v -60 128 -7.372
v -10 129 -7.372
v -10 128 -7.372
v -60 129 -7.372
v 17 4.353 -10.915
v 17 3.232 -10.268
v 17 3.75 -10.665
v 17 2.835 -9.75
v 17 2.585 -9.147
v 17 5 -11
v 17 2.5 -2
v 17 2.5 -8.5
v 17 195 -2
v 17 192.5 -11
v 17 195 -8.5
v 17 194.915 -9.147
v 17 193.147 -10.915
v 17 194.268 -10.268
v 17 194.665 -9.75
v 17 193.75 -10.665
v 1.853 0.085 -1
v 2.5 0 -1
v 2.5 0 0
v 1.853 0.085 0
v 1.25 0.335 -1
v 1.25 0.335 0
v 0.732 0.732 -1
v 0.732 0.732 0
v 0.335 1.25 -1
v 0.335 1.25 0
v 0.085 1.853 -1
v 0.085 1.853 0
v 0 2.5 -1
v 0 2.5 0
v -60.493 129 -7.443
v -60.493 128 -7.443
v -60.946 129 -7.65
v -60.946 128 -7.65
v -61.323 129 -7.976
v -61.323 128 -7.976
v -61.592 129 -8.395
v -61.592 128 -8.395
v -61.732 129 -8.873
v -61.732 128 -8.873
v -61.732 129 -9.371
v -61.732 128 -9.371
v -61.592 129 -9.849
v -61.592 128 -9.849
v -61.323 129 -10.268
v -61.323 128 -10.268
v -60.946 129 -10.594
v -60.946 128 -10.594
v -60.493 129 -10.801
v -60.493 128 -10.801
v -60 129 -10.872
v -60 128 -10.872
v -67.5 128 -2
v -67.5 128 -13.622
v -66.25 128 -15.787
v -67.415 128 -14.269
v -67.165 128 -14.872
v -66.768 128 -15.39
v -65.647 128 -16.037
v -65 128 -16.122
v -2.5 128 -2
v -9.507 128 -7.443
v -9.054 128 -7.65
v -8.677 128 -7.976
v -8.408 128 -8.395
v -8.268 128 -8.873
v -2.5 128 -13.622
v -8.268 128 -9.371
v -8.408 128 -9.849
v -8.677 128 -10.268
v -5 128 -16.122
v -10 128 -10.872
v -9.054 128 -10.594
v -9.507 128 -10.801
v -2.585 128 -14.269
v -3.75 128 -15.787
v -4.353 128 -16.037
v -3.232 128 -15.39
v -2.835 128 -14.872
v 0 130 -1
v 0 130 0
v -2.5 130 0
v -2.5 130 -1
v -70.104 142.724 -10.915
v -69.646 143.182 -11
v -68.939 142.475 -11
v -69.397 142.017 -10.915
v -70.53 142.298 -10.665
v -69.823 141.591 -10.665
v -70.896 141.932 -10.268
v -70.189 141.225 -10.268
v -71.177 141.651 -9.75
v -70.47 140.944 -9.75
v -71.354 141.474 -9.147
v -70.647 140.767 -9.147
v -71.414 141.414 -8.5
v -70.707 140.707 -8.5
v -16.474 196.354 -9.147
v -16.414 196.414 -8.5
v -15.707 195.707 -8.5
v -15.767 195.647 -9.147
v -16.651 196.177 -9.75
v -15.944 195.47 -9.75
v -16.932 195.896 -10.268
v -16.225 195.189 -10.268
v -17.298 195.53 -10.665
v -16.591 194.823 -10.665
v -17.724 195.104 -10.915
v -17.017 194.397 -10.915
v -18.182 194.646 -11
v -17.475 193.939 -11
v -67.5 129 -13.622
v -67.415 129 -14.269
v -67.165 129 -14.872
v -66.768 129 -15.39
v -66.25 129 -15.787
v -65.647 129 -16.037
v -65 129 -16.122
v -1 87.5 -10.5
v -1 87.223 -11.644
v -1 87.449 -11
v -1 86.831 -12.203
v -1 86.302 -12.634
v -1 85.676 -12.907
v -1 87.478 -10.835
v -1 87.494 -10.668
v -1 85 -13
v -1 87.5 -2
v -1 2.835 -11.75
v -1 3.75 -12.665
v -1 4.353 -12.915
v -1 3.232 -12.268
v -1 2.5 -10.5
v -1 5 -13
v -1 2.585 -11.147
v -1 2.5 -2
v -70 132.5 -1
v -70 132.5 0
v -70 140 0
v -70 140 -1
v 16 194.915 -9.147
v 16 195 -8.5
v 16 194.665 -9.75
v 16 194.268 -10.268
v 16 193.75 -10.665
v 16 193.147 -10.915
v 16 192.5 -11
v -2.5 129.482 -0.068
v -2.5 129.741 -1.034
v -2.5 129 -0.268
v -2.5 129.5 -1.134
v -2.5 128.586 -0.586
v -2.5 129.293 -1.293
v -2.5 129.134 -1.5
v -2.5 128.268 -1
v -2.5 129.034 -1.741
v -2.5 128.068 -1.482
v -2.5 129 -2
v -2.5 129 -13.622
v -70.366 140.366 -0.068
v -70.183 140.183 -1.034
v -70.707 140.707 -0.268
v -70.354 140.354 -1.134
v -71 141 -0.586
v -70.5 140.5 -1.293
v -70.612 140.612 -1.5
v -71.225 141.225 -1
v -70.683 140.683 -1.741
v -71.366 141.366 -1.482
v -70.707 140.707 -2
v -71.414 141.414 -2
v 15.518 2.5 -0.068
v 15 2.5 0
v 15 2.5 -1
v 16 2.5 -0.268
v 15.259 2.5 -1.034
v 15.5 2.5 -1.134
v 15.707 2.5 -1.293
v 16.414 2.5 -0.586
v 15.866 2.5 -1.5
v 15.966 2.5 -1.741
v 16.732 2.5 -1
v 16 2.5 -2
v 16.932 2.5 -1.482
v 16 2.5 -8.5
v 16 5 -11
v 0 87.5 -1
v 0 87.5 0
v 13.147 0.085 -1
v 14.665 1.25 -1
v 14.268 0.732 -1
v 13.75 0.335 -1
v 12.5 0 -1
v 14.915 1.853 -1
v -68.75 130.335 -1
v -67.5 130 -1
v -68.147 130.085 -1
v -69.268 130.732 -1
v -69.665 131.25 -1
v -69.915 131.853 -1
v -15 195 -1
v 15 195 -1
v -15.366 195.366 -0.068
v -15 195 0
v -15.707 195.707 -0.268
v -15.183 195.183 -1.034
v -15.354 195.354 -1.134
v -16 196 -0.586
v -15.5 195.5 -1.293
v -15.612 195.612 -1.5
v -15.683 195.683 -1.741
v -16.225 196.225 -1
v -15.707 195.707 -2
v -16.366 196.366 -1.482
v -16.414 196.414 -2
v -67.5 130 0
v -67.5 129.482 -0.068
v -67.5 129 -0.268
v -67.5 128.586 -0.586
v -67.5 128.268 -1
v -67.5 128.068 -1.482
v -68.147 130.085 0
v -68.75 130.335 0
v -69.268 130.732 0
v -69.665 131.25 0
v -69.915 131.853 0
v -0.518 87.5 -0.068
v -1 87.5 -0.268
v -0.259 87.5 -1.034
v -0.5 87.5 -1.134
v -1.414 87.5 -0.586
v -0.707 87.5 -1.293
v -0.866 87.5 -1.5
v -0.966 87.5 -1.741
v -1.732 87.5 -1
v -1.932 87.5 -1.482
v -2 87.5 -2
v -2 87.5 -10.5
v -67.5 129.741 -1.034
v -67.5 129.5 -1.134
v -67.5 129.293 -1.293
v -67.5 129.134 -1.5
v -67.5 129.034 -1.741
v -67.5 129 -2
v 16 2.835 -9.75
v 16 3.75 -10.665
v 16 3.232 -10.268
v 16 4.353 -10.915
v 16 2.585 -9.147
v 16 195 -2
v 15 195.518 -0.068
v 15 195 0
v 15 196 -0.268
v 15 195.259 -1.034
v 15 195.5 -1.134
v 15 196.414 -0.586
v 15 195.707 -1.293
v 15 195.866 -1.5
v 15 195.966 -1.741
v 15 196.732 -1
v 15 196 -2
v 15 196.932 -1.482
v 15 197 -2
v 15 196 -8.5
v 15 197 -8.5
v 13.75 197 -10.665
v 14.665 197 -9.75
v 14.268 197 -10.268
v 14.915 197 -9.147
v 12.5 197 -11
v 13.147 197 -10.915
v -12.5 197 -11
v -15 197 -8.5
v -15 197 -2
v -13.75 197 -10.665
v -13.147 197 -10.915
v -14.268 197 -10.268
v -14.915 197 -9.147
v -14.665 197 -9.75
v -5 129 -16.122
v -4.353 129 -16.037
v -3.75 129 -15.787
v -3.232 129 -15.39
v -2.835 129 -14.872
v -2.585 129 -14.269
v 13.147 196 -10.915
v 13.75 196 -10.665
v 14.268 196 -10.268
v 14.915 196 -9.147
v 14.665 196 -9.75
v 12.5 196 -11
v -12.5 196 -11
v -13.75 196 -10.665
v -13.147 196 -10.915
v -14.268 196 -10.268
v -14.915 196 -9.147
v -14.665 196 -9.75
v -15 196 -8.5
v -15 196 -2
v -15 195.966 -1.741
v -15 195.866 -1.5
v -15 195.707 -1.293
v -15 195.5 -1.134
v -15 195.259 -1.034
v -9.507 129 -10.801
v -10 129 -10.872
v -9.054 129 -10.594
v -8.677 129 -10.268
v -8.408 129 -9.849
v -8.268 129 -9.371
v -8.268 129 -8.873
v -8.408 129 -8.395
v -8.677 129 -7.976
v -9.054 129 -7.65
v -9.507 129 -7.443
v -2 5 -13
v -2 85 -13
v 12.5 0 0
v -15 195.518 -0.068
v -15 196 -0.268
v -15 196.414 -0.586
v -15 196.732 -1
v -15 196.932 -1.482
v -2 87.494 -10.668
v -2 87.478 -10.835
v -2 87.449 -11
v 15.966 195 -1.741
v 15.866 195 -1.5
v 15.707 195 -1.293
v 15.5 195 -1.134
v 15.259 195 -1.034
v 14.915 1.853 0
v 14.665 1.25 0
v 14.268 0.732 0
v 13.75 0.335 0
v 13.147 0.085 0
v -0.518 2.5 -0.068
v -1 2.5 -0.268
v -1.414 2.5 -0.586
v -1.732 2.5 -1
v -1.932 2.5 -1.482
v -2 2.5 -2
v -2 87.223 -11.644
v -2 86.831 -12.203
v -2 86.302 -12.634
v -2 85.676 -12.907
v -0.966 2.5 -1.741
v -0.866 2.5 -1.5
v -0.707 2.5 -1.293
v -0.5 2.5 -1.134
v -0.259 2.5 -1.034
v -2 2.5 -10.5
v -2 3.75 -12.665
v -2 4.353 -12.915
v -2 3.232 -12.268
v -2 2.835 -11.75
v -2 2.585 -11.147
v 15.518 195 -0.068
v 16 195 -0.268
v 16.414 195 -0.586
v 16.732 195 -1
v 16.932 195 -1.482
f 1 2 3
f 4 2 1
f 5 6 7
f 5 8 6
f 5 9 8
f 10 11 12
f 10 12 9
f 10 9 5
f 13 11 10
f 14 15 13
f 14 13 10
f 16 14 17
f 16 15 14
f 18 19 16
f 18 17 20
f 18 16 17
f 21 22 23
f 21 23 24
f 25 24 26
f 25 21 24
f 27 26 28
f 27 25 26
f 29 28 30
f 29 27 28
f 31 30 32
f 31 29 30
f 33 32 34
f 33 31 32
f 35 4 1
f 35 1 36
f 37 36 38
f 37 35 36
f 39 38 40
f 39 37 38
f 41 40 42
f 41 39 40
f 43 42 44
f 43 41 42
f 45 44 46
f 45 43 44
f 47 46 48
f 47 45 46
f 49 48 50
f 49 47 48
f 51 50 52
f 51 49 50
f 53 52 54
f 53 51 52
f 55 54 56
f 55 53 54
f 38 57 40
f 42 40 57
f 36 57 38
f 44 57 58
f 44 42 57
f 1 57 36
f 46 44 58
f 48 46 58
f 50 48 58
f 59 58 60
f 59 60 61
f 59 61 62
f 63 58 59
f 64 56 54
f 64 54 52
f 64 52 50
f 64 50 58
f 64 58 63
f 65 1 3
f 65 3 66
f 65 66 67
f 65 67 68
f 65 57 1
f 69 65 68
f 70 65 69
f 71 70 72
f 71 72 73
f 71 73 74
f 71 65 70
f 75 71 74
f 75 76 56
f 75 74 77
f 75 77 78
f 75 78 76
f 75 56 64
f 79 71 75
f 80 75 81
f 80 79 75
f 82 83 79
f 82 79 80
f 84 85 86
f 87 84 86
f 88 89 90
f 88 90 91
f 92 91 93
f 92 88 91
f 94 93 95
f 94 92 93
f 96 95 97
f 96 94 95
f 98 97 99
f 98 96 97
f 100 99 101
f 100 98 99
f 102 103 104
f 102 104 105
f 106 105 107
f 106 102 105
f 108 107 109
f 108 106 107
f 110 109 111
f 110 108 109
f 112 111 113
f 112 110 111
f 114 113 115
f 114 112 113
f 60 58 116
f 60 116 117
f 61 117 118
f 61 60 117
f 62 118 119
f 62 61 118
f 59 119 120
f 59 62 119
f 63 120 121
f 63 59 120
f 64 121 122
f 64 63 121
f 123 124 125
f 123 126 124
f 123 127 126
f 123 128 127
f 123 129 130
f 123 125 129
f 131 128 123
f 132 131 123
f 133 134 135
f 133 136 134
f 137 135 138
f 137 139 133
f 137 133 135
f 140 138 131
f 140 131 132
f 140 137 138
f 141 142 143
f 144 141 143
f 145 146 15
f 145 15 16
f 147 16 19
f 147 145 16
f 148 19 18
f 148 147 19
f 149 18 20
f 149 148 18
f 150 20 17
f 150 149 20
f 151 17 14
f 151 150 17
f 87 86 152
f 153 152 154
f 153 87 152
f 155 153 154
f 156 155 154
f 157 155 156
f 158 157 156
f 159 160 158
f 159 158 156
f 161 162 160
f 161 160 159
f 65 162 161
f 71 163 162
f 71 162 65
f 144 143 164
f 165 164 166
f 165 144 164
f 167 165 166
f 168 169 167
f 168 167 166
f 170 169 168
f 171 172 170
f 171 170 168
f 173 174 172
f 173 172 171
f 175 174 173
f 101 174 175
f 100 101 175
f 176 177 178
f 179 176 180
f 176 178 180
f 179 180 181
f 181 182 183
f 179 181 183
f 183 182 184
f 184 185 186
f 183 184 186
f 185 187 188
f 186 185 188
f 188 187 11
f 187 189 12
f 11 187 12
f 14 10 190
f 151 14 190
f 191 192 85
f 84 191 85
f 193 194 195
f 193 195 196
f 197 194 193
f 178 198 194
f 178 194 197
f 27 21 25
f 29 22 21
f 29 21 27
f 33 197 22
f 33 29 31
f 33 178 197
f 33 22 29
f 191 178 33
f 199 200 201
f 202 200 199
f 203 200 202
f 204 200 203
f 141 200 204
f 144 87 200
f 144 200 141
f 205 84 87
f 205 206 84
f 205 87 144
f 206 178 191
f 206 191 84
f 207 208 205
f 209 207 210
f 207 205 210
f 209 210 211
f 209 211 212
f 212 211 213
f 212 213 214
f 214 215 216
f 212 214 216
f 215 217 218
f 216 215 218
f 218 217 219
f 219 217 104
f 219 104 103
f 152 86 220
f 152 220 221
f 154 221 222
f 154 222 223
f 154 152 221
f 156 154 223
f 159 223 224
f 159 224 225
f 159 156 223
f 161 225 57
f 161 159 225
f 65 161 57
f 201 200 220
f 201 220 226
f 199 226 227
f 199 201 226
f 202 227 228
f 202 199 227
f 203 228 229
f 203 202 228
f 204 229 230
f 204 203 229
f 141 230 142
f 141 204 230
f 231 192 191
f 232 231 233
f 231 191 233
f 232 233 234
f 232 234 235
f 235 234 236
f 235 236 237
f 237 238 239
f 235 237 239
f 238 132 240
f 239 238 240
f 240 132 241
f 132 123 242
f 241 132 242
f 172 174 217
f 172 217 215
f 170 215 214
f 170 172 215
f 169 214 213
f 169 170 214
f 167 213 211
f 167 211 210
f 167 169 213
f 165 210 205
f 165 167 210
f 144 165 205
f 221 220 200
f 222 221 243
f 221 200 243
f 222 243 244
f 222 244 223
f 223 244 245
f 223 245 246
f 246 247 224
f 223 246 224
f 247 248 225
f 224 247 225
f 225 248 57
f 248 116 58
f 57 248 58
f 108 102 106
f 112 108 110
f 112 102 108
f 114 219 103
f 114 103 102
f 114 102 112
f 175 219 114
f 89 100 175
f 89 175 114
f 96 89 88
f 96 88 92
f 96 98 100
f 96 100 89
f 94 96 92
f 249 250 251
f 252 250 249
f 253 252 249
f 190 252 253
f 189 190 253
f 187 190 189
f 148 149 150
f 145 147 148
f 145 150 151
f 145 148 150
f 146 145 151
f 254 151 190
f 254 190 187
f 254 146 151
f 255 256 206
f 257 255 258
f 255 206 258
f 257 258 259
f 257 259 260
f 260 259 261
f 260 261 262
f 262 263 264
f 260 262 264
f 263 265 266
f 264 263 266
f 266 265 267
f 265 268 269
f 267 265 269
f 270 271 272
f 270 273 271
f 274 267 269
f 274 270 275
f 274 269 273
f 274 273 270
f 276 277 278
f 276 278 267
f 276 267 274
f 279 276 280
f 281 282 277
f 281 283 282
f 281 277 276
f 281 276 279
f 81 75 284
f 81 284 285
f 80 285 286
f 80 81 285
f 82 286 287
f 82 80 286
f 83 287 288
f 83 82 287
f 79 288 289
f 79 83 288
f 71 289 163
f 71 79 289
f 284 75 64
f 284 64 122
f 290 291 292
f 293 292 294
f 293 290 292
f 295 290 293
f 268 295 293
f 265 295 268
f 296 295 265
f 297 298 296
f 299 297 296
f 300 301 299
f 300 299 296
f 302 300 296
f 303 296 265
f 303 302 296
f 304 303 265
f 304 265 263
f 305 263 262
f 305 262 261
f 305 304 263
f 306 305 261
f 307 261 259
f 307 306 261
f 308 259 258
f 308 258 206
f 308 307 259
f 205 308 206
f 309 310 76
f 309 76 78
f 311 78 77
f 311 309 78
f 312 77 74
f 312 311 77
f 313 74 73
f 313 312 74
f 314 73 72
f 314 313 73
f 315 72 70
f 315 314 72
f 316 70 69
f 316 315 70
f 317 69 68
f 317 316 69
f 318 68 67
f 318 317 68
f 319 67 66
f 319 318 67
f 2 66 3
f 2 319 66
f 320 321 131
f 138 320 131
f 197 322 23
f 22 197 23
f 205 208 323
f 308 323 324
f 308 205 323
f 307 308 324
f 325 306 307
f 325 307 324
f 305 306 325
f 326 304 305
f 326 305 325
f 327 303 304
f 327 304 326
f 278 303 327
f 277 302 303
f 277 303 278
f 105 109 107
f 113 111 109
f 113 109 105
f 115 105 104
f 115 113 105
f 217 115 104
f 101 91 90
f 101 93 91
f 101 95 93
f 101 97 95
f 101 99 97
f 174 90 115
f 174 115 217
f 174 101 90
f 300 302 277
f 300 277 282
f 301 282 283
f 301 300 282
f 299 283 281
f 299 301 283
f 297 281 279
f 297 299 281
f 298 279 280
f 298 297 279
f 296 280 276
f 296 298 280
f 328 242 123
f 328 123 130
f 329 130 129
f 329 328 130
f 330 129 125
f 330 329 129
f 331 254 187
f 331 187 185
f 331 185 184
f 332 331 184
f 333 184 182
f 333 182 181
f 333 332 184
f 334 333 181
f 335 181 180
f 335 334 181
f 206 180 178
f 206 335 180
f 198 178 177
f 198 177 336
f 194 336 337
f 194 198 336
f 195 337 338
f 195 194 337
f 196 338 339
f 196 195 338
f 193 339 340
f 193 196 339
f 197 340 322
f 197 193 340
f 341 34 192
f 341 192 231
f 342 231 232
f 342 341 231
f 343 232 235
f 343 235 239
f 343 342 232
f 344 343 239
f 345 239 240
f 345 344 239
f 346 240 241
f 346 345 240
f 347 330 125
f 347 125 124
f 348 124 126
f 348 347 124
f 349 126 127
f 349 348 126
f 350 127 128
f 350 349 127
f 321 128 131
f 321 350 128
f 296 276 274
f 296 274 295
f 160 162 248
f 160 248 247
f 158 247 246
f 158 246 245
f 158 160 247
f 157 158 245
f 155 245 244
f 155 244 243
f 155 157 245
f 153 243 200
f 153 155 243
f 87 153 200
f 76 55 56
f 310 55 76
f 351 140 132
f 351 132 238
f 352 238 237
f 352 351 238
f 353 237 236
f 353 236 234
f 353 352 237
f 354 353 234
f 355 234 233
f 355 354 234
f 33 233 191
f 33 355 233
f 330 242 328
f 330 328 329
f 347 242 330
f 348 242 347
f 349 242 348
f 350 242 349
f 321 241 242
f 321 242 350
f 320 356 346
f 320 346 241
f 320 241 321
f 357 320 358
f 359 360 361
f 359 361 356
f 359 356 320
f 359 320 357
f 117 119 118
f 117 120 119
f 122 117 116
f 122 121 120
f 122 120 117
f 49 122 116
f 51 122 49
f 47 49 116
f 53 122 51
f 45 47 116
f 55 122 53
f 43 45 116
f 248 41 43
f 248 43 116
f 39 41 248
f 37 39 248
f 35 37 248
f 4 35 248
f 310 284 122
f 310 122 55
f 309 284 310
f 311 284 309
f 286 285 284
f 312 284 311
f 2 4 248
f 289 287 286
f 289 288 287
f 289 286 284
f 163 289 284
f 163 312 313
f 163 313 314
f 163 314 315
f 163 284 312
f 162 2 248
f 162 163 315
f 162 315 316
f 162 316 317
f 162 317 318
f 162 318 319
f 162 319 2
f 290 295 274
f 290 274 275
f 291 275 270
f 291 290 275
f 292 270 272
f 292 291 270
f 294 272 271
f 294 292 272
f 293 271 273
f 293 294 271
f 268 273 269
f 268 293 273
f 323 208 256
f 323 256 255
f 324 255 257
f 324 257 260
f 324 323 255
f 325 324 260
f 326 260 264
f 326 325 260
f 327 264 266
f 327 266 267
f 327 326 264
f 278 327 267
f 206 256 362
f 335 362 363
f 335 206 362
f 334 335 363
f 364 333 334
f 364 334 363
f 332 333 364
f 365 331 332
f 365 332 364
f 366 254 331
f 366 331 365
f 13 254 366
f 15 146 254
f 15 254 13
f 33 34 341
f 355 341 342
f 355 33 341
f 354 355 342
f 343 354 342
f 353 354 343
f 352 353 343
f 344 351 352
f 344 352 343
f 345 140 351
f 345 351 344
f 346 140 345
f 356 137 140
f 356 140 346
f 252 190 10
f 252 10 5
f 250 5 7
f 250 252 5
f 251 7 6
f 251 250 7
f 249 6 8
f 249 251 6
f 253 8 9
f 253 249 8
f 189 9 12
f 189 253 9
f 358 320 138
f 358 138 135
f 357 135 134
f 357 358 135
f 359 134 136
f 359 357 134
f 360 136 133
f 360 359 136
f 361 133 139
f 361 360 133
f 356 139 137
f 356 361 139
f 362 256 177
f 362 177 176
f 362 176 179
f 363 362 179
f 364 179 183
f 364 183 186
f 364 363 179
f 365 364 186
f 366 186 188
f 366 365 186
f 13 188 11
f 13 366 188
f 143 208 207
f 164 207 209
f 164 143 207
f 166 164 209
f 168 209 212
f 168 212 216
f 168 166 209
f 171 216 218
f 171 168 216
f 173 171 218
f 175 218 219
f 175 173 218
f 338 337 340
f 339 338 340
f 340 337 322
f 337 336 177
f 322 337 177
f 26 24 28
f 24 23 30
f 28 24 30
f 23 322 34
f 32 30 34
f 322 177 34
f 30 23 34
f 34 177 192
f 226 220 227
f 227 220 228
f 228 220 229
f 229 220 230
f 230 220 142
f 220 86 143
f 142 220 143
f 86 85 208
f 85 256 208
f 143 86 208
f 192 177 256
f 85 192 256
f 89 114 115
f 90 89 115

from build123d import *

# Parameters (mm, degrees)
BASE_FLANGE1_DEPTH    = 1
EDGE_FLANGE2_DEPTH    = 85
EDGE_FLANGE3_DEPTH    = 192.5
EDGE_FLANGE1_DEPTH    = 65
EDGE_FLANGE4_DEPTH    = 77.781745931
EDGE_FLANGE5_DEPTH    = 30
BREAK_CORNER1_START   = 128
BREAK_CORNER1_DEPTH   = 69
BREAK_CORNER1_START_2 = 196
BREAK_CORNER1_2_DEPTH = 1
BREAK_CORNER1_START_3 = -150.492424049
BREAK_CORNER1_3_DEPTH = 1
BREAK_CORNER1_START_4 = -2
BREAK_CORNER1_4_DEPTH = 19
BREAK_CORNER1_START_5 = 16
BREAK_CORNER1_5_DEPTH = 1
BREAK_CORNER1_6_DEPTH = 1
BREAK_CORNER1_START_6 = -1
BREAK_CORNER1_7_DEPTH = 1
CUT_EXTRUDE1_REACH    = 150.327


# Read off the part's stored shape, not the designer's step: Break-Corner1
# Sheet-metal steps are written as plain solids
with BuildPart() as part:
    # Sketch1 → Base-Flange1 (new body)
    with BuildSketch(Plane.XY):
        Polygon((0, 130), (-70, 130), (-70, 140), (-15, 195), (15, 195), (15, 130), (15, 0), (0, 0), align=None)
    extrude(amount=-BASE_FLANGE1_DEPTH)

    # Edge-Flange2 section (across the edge) → Edge-Flange2 (add)
    with BuildSketch(Plane(origin=(-1, 2.5, -1), x_dir=(1, 0, 0), z_dir=(0, 1, 0))):
        with BuildLine():
            Line((-1, 1), (-1, 12))
            Line((-1, 12), (0, 12))
            Line((0, 12), (0, 1))
            ThreePointArc((0, 1), (0.292893219, 0.292893219), (1, 0))
            Line((1, 0), (1, -1))
            ThreePointArc((1, -1), (-0.414213562, -0.414213562), (-1, 1))
        make_face()
    extrude(amount=EDGE_FLANGE2_DEPTH)

    # Edge-Flange3 section (across the edge) → Edge-Flange3 (add)
    with BuildSketch(Plane(origin=(16, 195, -1), x_dir=(-1, 0, 0), z_dir=(0, -1, 0))):
        with BuildLine():
            Line((-1, 1), (-1, 10))
            Line((-1, 10), (0, 10))
            Line((0, 10), (0, 1))
            ThreePointArc((0, 1), (0.292893219, 0.292893219), (1, 0))
            Line((1, 0), (1, -1))
            ThreePointArc((1, -1), (-0.414213562, -0.414213562), (-1, 1))
        make_face()
    extrude(amount=EDGE_FLANGE3_DEPTH)

    # Edge-Flange1 section (across the edge) → Edge-Flange1 (add)
    with BuildSketch(Plane(origin=(-2.5, 129, -1), x_dir=(0, 1, 0), z_dir=(-1, 0, 0))):
        with BuildLine():
            Line((-1, 1), (-1, 15.122069622))
            Line((-1, 15.122069622), (0, 15.122069622))
            Line((0, 15.122069622), (0, 1))
            ThreePointArc((0, 1), (0.292893219, 0.292893219), (1, 0))
            Line((1, 0), (1, -1))
            ThreePointArc((1, -1), (-0.414213562, -0.414213562), (-1, 1))
        make_face()
    extrude(amount=EDGE_FLANGE1_DEPTH)

    # Edge-Flange4 section (across the edge) → Edge-Flange4 (add)
    with BuildSketch(Plane(origin=(-70.707106781, 140.707106781, -1), x_dir=(0.7071067811865439, -0.7071067811865512, -3.4914813388431337e-15), z_dir=(0.7071067811865512, 0.7071067811865439, 0))):
        with BuildLine():
            Line((-1, 1), (-1, 10))
            Line((-1, 10), (0, 10))
            Line((0, 10), (0, 1))
            ThreePointArc((0, 1), (0.292893219, 0.292893219), (1, 0))
            Line((1, 0), (1, -1))
            ThreePointArc((1, -1), (-0.414213562, -0.414213562), (-1, 1))
        make_face()
    extrude(amount=EDGE_FLANGE4_DEPTH)

    # Edge-Flange5 section (across the edge) → Edge-Flange5 (add)
    with BuildSketch(Plane(origin=(-15, 196, -1), x_dir=(0, -1, 0), z_dir=(1, 0, 0))):
        with BuildLine():
            Line((-1, 1), (-1, 10))
            Line((-1, 10), (0, 10))
            Line((0, 10), (0, 1))
            ThreePointArc((0, 1), (0.292893219, 0.292893219), (1, 0))
            Line((1, 0), (1, -1))
            ThreePointArc((1, -1), (-0.414213562, -0.414213562), (-1, 1))
        make_face()
    extrude(amount=EDGE_FLANGE5_DEPTH)

    # Break-Corner1 outline → Break-Corner1 (cut)
    with BuildSketch(Plane(origin=(0, 0, 0), x_dir=(1, 0, 0), z_dir=(0, 1, 0)).offset(BREAK_CORNER1_START)):
        with BuildLine():
            ThreePointArc((-67.5, 13.622069622), (-66.767766953, 15.389836575), (-65, 16.122069622))
            Line((-65, 16.122069622), (-67.5, 16.122069622))
            Line((-67.5, 16.122069622), (-67.5, 13.622069622))
        make_face()
        with BuildLine():
            ThreePointArc((-5, 16.122069622), (-3.232233047, 15.389836575), (-2.5, 13.622069622))
            Line((-2.5, 13.622069622), (-2.5, 16.122069622))
            Line((-2.5, 16.122069622), (-5, 16.122069622))
        make_face()
        with BuildLine():
            Line((15, 11), (12.5, 11))
            ThreePointArc((12.5, 11), (14.267766953, 10.267766953), (15, 8.5))
            Line((15, 8.5), (15, 11))
        make_face()
    extrude(amount=BREAK_CORNER1_DEPTH, mode=Mode.SUBTRACT)

    # Break-Corner1 2 outline → Break-Corner1 2 (cut)
    with BuildSketch(Plane(origin=(0, 0, 0), x_dir=(1, 0, 0), z_dir=(0, 1, 0)).offset(BREAK_CORNER1_START_2)):
        with BuildLine():
            Line((-15, 11), (-15, 8.5))
            ThreePointArc((-15, 8.5), (-14.267766953, 10.267766953), (-12.5, 11))
            Line((-12.5, 11), (-15, 11))
        make_face()
    extrude(amount=BREAK_CORNER1_2_DEPTH, mode=Mode.SUBTRACT)

    # Break-Corner1 3 outline → Break-Corner1 3 (cut)
    with BuildSketch(Plane(origin=(0, 0, 0), x_dir=(0.7071067811865509, 0.707106781186544, 0), z_dir=(0.707106781186544, -0.707106781186551, 0)).offset(BREAK_CORNER1_START_3)):
        with BuildLine():
            Line((49.497474683, -11), (51.997474683, -11))
            ThreePointArc((51.997474683, -11), (50.22970773, -10.267766953), (49.497474683, -8.5))
            Line((49.497474683, -8.5), (49.497474683, -11))
        make_face()
        with BuildLine():
            ThreePointArc((127.279220614, -8.5), (126.546987567, -10.267766953), (124.779220614, -11))
            Line((124.779220614, -11), (127.279220614, -11))
            Line((127.279220614, -11), (127.279220614, -8.5))
        make_face()
    extrude(amount=BREAK_CORNER1_3_DEPTH, mode=Mode.SUBTRACT)

    # Break-Corner1 4 outline → Break-Corner1 4 (cut)
    with BuildSketch(Plane.YZ.offset(BREAK_CORNER1_START_4)):
        with BuildLine():
            ThreePointArc((195, -8.5), (194.267766953, -10.267766953), (192.5, -11))
            Line((192.5, -11), (195, -11))
            Line((195, -11), (195, -8.5))
        make_face()
        with BuildLine():
            ThreePointArc((87.449489743, -11), (86.58113883, -12.436491673), (85, -13))
            Line((85, -13), (87.5, -13))
            Line((87.5, -13), (87.5, -11))
            Line((87.5, -11), (87.449489743, -11))
        make_face()
        with BuildLine():
            Line((2.5, -13), (5, -13))
            ThreePointArc((5, -13), (3.232233047, -12.267766953), (2.5, -10.5))
            Line((2.5, -10.5), (2.5, -13))
        make_face()
    extrude(amount=BREAK_CORNER1_4_DEPTH, mode=Mode.SUBTRACT)

    # Break-Corner1 5 outline → Break-Corner1 5 (cut)
    with BuildSketch(Plane.YZ.offset(BREAK_CORNER1_START_5)):
        with BuildLine():
            Line((2.550510257, -11), (5, -11))
            ThreePointArc((5, -11), (3.232233047, -10.267766953), (2.5, -8.5))
            Line((2.5, -8.5), (2.5, -10.5))
            ThreePointArc((2.5, -10.5), (2.512659617, -10.751272405), (2.550510257, -11))
        make_face()
    extrude(amount=BREAK_CORNER1_5_DEPTH, mode=Mode.SUBTRACT)

    # Break-Corner1 6 outline → Break-Corner1 6 (cut)
    with BuildSketch(Plane.YZ.offset(BREAK_CORNER1_START_4)):
        with BuildLine():
            ThreePointArc((87.5, -10.5), (87.487340383, -10.751272405), (87.449489743, -11))
            Line((87.449489743, -11), (87.5, -11))
            Line((87.5, -11), (87.5, -10.5))
        make_face()
    extrude(amount=BREAK_CORNER1_6_DEPTH, mode=Mode.SUBTRACT)

    # Break-Corner1 7 outline → Break-Corner1 7 (cut)
    with BuildSketch(Plane.XY.offset(BREAK_CORNER1_START_6)):
        with BuildLine():
            ThreePointArc((-67.5, 130), (-69.267766953, 130.732233047), (-70, 132.5))
            Line((-70, 132.5), (-70, 130))
            Line((-70, 130), (-67.5, 130))
        make_face()
        with BuildLine():
            Line((0, 0), (2.5, 0))
            ThreePointArc((2.5, 0), (0.732233047, 0.732233047), (0, 2.5))
            Line((0, 2.5), (0, 0))
        make_face()
        with BuildLine():
            ThreePointArc((15, 2.5), (14.267766953, 0.732233047), (12.5, 0))
            Line((12.5, 0), (15, 0))
            Line((15, 0), (15, 2.5))
        make_face()
    extrude(amount=BREAK_CORNER1_7_DEPTH, mode=Mode.SUBTRACT)

    # Sketch15 → Cut-Extrude1 (cut, up to next)
    with BuildSketch(Plane(origin=(0, 129, 0), x_dir=(1, 0, 0), z_dir=(0, 1, 0)), mode=Mode.PRIVATE) as cut_extrude1_sk1:
        with BuildLine():
            Line((-60, 10.872069622), (-10, 10.872069622))
            ThreePointArc((-10, 10.872069622), (-8.25, 9.122069622), (-10, 7.372069622))
            Line((-10, 7.372069622), (-60, 7.372069622))
            ThreePointArc((-60, 7.372069622), (-61.75, 9.122069622), (-60, 10.872069622))
        make_face()
    cut_extrude1_tool1 = extrude(cut_extrude1_sk1.sketch, amount=-CUT_EXTRUDE1_REACH, mode=Mode.PRIVATE) & part.part
    add(cut_extrude1_tool1.solids().sort_by_distance((-35, 129, -9.12207))[0], mode=Mode.SUBTRACT)


solid = part.part
